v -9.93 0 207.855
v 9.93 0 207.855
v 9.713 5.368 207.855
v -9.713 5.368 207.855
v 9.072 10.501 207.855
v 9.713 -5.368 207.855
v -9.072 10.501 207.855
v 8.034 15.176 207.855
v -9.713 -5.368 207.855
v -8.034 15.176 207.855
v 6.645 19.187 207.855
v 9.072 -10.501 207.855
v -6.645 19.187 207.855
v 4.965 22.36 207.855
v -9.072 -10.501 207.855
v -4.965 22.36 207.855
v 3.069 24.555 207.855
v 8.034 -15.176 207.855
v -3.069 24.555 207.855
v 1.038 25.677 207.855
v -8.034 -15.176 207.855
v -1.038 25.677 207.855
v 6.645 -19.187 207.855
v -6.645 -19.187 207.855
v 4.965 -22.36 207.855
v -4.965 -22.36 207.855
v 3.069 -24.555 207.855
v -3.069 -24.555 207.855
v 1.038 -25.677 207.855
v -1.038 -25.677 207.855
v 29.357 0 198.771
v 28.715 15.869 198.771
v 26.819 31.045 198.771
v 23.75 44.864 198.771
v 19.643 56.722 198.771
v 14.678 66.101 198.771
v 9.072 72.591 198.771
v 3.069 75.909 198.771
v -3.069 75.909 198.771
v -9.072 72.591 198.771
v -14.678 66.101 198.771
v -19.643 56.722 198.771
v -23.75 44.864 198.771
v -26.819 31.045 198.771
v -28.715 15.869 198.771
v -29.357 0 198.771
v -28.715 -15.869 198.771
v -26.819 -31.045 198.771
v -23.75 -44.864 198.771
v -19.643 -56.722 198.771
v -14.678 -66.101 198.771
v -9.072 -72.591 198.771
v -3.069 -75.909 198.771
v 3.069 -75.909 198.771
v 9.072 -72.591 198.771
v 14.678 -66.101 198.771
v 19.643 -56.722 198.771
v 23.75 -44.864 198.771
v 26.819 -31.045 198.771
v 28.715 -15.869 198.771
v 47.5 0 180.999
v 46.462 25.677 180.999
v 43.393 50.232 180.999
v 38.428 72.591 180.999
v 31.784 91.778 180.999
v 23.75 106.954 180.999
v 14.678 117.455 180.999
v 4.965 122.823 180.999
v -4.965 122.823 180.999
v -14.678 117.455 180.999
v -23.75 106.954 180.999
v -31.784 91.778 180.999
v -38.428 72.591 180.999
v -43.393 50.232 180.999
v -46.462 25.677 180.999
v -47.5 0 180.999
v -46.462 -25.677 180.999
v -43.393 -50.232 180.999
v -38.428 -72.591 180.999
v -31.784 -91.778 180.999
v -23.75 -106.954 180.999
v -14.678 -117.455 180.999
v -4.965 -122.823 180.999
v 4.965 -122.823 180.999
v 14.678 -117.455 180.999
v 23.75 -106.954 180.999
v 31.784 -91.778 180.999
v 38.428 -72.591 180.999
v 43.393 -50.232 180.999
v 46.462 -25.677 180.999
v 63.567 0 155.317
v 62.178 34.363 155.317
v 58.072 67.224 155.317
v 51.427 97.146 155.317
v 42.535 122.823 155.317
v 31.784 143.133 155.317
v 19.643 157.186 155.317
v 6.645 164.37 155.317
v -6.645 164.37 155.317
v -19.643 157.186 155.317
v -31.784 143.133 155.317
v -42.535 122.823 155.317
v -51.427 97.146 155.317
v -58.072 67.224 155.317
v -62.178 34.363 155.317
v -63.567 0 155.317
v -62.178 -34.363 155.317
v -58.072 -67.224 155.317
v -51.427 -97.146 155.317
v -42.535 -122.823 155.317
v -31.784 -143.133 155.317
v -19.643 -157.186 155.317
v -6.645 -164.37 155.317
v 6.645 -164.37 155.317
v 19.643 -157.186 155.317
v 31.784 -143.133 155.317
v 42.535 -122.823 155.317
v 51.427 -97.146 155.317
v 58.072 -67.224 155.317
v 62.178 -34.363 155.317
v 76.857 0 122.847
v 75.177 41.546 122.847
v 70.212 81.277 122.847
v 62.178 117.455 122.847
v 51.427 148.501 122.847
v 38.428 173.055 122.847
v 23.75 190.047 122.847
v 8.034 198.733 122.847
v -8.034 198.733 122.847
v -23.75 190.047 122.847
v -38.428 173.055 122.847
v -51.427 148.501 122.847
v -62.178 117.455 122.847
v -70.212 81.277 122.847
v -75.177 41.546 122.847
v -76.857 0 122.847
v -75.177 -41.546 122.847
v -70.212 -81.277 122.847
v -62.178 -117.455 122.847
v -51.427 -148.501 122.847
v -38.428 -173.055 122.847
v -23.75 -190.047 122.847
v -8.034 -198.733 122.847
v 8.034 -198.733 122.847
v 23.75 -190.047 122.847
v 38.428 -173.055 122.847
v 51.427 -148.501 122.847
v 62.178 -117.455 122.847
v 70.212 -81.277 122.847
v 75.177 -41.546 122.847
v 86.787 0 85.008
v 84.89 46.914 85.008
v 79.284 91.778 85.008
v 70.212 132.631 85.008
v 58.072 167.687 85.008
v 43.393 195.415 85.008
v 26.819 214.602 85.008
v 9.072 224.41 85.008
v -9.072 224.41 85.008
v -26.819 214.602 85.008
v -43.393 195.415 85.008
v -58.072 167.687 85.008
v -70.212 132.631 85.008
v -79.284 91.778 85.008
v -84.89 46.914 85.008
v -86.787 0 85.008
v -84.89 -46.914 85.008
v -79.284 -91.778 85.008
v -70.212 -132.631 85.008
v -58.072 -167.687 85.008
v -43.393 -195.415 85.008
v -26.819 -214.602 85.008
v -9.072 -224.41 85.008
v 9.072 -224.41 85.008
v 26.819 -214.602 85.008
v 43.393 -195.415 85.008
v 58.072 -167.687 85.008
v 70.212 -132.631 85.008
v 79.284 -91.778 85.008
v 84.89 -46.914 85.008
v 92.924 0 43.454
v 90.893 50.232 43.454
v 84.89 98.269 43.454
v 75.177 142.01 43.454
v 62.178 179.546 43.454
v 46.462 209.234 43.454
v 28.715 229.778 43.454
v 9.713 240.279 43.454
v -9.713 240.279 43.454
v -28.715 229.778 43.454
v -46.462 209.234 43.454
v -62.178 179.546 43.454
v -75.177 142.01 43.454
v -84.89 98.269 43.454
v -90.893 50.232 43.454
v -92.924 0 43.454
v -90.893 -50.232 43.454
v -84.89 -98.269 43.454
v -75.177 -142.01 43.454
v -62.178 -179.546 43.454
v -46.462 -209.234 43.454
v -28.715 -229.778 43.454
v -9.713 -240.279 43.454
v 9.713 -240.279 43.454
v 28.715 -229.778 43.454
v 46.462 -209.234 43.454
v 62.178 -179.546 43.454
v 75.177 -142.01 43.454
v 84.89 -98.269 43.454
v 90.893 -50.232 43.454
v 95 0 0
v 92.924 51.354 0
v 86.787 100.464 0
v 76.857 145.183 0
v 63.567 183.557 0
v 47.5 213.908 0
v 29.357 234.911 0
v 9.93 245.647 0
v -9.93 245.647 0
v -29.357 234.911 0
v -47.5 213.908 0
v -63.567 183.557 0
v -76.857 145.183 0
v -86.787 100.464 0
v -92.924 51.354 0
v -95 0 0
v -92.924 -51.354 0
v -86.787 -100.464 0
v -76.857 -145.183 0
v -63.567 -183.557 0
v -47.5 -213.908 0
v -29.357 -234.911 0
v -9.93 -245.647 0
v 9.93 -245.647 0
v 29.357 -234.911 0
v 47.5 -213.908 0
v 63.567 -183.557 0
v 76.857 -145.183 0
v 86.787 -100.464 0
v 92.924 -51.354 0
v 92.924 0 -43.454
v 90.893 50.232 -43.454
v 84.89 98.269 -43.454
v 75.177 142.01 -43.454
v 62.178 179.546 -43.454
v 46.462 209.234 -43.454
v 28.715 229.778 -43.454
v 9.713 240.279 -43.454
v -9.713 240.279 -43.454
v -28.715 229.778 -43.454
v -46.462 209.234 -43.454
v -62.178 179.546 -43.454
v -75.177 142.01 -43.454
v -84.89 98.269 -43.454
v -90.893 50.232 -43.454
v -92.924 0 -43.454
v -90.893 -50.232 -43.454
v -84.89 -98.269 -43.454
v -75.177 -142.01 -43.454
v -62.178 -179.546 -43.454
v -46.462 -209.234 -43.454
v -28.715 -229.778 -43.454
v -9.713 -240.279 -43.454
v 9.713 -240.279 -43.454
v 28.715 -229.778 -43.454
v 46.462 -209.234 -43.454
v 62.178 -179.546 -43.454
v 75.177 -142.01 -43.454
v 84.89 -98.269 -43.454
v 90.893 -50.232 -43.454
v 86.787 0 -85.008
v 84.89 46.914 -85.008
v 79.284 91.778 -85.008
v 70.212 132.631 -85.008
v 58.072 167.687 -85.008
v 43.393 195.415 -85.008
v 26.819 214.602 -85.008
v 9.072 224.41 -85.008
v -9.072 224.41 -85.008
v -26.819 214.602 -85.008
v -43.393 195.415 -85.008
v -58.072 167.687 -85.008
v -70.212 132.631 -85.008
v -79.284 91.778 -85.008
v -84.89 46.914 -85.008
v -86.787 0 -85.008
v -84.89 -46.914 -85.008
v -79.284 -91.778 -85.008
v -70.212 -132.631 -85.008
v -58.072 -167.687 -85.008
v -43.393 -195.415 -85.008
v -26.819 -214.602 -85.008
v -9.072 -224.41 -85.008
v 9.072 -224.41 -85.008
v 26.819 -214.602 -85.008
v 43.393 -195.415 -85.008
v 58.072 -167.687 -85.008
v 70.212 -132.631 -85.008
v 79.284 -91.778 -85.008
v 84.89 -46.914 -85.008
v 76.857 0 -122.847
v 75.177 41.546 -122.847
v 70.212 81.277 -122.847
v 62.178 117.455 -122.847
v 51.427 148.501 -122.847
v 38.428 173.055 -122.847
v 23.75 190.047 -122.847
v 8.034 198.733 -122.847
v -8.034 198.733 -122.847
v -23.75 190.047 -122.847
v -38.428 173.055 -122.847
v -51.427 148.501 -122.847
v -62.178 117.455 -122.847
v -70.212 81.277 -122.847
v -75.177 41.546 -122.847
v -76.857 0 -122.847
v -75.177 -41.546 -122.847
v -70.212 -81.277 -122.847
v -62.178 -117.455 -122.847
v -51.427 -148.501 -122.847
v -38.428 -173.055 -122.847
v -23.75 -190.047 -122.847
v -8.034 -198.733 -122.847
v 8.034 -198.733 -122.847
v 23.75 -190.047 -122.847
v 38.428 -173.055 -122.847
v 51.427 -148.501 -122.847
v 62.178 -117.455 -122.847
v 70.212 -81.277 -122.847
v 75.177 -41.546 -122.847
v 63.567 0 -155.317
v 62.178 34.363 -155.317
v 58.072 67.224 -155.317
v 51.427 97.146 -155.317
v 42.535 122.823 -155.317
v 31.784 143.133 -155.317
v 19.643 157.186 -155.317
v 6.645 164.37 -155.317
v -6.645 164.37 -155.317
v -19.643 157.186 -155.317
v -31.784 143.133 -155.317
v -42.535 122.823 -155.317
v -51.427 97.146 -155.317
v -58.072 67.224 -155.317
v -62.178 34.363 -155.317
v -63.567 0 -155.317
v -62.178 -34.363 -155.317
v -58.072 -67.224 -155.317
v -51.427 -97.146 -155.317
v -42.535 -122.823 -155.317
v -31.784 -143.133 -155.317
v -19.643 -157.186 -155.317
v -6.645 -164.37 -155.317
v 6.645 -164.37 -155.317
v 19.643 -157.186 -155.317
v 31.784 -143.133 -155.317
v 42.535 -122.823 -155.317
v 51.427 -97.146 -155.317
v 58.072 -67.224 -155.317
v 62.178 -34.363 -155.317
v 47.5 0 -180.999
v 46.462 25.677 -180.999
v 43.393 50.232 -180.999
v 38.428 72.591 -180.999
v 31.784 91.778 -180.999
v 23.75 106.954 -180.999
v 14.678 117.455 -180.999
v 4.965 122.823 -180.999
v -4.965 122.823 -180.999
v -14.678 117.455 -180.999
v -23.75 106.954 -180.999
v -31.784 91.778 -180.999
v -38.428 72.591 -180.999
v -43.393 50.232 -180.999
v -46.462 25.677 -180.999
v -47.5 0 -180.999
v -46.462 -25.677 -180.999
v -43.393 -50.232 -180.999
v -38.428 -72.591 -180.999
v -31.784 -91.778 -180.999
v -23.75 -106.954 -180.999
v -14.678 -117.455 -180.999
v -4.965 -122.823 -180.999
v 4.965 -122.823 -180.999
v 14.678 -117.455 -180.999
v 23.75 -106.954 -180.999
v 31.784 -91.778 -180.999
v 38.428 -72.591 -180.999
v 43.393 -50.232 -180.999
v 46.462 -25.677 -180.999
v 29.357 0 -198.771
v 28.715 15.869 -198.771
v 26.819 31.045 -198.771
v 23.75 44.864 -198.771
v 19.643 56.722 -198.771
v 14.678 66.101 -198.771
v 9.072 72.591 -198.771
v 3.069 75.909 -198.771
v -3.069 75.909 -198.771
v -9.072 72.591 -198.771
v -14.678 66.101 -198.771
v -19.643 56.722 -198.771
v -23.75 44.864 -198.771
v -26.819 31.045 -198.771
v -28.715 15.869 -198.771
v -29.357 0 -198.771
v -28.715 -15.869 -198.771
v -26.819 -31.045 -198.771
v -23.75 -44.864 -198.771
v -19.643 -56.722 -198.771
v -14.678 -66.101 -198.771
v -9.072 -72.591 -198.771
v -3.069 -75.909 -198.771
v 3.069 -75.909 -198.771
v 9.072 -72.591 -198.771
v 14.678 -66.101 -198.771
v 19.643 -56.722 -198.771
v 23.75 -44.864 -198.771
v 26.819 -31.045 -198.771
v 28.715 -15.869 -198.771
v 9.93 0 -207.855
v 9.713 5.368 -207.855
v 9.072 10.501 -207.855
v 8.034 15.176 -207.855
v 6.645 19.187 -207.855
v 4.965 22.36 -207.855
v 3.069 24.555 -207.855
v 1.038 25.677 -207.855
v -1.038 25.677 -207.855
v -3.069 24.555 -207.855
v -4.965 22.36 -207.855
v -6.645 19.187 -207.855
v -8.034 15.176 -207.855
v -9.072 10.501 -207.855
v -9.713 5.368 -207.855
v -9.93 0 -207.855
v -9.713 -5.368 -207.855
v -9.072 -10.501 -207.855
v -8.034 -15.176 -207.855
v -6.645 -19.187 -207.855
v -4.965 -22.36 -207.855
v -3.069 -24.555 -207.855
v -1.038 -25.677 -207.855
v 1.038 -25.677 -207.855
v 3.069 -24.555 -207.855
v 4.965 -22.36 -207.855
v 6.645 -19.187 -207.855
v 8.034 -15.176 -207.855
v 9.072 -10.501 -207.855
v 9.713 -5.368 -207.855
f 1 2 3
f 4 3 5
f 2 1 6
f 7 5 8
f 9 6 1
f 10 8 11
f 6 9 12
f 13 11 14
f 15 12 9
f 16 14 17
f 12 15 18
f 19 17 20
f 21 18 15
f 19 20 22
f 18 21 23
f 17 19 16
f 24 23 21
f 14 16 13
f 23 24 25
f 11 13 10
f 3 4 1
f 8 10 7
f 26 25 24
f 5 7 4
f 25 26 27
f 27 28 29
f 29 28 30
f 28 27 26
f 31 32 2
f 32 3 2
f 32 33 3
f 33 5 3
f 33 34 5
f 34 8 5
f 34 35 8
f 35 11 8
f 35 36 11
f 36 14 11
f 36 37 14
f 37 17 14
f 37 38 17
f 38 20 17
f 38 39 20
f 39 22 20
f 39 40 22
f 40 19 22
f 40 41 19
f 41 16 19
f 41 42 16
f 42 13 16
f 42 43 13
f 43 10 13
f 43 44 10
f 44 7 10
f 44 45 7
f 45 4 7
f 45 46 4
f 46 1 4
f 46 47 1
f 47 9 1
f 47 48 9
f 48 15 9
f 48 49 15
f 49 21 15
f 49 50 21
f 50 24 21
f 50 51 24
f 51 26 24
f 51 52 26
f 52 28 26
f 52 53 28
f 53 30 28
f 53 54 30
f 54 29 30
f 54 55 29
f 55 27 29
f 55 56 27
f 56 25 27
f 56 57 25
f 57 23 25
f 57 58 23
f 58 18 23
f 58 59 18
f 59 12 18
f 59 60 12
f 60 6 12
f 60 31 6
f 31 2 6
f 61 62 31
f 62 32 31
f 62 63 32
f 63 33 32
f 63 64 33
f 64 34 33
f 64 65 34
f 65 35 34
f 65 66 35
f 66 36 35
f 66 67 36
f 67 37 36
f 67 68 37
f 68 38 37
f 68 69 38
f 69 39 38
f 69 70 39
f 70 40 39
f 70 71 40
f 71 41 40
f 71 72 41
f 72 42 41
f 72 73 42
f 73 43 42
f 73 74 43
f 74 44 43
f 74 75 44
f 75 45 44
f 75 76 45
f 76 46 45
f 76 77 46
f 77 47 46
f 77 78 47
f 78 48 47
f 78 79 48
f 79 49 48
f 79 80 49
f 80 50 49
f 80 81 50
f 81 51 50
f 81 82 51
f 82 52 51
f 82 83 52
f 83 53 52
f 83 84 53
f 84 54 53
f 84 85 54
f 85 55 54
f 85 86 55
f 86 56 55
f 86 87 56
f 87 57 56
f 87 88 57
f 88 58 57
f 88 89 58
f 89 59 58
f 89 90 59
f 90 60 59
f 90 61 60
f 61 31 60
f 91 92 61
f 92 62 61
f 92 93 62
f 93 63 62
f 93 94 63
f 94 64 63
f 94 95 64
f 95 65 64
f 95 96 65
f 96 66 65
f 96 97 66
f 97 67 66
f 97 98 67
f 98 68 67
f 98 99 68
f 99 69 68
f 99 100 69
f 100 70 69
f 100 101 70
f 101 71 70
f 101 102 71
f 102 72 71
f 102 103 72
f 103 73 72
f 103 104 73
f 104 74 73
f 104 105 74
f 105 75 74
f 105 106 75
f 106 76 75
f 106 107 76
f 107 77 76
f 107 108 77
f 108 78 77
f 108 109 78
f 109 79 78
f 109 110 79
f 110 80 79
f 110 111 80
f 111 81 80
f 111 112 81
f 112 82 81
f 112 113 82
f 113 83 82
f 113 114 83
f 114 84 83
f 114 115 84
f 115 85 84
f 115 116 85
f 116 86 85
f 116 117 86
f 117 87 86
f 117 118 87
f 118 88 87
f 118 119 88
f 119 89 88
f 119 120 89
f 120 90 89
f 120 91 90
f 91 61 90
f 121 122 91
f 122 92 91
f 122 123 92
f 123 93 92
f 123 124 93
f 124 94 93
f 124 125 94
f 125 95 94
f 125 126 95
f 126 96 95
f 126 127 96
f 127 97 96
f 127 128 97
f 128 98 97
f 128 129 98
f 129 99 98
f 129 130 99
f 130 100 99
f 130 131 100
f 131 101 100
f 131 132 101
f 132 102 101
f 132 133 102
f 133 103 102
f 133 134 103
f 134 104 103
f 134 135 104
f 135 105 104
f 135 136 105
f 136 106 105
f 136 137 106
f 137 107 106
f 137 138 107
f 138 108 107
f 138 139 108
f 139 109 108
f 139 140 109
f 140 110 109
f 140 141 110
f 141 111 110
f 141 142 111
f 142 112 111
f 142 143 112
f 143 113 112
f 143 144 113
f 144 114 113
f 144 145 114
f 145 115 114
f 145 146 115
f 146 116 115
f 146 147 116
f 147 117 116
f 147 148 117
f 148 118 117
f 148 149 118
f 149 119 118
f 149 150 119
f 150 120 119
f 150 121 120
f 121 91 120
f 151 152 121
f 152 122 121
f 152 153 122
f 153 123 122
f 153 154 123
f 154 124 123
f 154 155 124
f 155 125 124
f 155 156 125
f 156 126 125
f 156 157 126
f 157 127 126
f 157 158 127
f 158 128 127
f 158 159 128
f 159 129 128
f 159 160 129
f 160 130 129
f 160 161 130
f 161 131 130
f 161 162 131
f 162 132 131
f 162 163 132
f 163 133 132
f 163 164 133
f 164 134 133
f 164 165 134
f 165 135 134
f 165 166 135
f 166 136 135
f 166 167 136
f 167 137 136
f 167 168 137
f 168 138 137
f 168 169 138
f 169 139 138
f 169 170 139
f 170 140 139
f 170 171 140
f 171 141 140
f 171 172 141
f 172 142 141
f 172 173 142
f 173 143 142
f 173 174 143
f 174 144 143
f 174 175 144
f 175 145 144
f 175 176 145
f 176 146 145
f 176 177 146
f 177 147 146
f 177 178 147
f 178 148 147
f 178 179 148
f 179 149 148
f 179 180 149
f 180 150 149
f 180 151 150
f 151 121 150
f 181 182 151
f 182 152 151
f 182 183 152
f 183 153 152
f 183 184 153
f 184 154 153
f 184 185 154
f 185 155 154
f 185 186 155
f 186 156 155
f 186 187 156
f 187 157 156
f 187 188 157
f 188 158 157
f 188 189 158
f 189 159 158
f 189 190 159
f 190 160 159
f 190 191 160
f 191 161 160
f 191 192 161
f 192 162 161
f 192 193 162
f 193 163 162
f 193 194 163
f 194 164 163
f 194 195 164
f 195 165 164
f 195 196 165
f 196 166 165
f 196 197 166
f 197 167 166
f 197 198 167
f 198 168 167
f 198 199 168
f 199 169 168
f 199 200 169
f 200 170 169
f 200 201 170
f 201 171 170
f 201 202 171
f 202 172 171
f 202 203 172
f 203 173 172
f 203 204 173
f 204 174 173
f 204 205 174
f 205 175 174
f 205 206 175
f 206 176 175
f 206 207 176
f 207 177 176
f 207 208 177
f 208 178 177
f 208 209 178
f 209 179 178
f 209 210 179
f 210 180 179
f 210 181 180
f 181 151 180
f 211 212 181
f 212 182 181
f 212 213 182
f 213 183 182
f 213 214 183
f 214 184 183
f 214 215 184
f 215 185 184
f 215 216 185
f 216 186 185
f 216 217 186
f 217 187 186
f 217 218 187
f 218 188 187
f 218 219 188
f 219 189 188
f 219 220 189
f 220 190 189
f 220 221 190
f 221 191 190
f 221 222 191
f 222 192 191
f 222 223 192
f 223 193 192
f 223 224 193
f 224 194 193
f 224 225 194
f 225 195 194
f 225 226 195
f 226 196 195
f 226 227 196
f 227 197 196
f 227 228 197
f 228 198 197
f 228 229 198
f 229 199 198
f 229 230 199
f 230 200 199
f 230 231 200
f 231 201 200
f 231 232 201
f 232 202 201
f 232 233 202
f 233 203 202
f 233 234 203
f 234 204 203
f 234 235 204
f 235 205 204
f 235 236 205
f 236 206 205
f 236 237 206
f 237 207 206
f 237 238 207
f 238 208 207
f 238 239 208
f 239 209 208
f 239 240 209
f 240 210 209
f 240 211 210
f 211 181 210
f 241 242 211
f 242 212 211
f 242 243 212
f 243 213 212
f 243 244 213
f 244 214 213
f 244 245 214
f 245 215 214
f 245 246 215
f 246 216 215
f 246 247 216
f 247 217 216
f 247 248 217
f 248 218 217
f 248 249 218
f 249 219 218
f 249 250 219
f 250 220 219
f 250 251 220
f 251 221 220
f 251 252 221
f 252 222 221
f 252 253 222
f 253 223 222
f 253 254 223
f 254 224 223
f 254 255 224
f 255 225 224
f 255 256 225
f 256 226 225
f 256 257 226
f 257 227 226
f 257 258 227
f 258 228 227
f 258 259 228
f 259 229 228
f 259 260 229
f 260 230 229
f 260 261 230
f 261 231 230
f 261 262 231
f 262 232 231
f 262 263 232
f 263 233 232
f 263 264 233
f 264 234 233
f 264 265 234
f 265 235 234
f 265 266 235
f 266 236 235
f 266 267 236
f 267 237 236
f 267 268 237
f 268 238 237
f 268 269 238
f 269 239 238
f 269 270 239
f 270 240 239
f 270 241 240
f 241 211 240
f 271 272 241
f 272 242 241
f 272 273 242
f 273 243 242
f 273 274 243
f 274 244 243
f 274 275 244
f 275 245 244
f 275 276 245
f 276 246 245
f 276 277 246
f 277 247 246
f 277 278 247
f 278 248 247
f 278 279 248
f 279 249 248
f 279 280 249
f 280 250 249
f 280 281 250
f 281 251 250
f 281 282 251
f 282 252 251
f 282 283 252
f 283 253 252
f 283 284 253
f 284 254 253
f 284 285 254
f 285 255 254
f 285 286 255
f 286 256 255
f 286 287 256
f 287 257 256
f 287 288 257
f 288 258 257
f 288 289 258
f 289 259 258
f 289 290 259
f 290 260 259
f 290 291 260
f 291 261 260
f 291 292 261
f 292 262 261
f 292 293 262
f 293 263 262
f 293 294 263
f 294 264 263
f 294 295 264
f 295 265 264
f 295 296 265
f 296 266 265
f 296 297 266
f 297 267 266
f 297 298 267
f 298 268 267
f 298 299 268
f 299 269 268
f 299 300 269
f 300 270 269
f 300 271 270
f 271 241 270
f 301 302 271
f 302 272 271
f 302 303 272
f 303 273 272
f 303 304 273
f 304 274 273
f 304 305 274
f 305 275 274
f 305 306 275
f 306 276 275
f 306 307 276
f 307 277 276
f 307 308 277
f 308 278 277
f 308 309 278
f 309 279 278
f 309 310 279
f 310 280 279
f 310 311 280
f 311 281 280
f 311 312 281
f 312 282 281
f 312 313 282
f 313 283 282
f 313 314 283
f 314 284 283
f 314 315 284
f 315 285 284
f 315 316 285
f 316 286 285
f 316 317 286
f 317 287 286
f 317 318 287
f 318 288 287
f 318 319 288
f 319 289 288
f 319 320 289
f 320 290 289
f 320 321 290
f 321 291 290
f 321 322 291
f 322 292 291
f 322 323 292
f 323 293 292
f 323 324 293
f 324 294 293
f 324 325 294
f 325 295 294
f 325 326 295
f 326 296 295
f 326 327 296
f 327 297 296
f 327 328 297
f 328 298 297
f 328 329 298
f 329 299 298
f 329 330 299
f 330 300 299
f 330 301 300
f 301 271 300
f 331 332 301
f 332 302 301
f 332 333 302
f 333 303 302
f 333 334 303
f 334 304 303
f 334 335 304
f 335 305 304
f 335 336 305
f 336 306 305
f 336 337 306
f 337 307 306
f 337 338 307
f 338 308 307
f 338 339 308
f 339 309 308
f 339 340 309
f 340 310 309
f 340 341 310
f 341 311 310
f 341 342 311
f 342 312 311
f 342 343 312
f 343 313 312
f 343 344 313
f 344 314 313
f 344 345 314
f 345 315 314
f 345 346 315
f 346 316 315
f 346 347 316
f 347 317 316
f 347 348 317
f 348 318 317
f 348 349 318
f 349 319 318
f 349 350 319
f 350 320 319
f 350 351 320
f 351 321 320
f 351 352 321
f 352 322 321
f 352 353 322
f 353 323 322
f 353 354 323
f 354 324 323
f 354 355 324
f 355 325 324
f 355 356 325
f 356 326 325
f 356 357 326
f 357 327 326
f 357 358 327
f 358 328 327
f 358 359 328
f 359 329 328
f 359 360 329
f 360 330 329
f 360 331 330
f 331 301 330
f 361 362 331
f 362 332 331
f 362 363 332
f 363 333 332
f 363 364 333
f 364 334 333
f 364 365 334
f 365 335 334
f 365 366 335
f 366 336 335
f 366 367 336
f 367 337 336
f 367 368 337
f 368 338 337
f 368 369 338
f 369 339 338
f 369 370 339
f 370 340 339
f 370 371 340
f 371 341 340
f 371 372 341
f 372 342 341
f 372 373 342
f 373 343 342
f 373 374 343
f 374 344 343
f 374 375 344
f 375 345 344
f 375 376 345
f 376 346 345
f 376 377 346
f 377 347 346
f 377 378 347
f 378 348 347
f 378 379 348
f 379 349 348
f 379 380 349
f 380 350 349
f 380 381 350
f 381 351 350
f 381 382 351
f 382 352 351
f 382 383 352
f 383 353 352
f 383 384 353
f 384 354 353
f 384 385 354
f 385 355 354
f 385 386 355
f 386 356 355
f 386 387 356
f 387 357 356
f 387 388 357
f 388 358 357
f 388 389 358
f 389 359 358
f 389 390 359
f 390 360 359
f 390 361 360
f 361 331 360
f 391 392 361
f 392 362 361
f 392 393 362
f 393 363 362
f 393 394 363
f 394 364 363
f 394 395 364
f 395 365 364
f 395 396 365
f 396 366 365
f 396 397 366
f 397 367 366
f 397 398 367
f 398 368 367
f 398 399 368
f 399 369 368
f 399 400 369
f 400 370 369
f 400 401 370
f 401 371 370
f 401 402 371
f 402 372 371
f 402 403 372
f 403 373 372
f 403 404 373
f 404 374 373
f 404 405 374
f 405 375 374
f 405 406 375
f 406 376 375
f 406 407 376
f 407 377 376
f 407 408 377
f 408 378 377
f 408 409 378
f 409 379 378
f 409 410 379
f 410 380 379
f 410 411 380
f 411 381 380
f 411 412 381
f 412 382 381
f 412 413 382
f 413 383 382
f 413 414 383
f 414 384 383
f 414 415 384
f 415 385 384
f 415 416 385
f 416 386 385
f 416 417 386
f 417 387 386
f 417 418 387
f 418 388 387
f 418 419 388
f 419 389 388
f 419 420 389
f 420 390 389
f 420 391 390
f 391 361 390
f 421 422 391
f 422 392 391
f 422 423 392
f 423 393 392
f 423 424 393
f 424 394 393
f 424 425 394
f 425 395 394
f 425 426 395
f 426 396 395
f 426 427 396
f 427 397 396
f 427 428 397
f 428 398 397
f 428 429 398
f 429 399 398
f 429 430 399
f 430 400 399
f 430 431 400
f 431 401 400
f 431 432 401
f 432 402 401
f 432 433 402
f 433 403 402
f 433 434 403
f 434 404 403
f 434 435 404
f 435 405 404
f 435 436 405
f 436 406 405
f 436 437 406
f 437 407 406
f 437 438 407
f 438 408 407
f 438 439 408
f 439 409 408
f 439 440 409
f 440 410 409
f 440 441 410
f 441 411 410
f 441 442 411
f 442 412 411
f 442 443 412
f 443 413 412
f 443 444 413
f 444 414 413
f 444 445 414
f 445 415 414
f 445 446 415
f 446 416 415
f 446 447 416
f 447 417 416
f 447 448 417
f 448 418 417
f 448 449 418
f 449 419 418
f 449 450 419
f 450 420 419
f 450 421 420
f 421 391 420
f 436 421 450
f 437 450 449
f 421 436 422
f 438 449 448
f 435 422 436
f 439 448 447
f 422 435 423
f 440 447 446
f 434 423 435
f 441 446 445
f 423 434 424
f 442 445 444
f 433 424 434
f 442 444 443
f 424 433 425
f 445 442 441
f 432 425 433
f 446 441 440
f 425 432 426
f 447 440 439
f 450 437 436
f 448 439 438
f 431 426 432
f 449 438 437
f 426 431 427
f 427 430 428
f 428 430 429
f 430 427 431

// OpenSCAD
// Generated by SolidPython 1.0.1 on 2020-07-29 00:46:46


scale(v = [5, 13, 11]) {
	sphere(r = 19);
}
/***********************************************
*********      SolidPython code:      **********
************************************************
 
# import packages: SolidPython
from solid import *
from solid.utils import *
from itertools import chain, combinations, permutations


class Resize:

    def __init__(self, scad_file):
        self.scad_file = scad_file
        #self.scad_file = import_scad(scad_file)
        # cone/cylinder param:
        self.r1 = 0
        self.r2 = 0
        self.h = 0
        # rectangular prism param:
        self.w = 0
        self.l = 0
        # ellipse param:
        self.r = 0

    # import OpenScad code (file name corresponds to shape)


    # classify shape + parameters
    def assign(self, param1, param2, param3):
        if self.scad_file == 'cone.scad':
            self.r1 = param1
            self.r2 = param2
            self.h = param3
        elif self.scad_file == 'cylinder.scad':
            self.r1 = param1
            self.r2 = param2
            self.h = param3
        elif self.scad_file == 'rectangularPrism.scad':
            self.h = param1
            self.l = param2
            self.w = param3
        else:
            self.r = param1
            self.h = param2

    # resize parameters
    def iterate(self):
        x = range(3, 20, 2)
        i = 1
        if self.scad_file == 'cone.scad':
            tempList = list(permutations(x, 2))
            for temp in tempList:
                param1 = temp[0]
                param2 = temp[1]
                filepath = 'produced_scad_files/' + 'cone' + str(param1) + '_' + str(param2) + '_' + '.scad'
                scad_render_to_file(cylinder(h=param1, r1=param2, r2=0), filepath)

        elif self.scad_file == 'cylinder.scad':
            tempList = list(permutations(x, 3))
            for temp in tempList:
                param1 = temp[0]
                param2 = temp[1]
                filepath = 'produced_scad_files/' + 'cylinder' + str(param1) + '_' + str(param2) + '_' + '.scad'
                scad_render_to_file(cylinder(h=param1, r1=param2, r2=param2), filepath)

        elif self.scad_file == 'rectangularPrism.scad':
            tempList = list(permutations(x, 3))
            for temp in tempList:
                param1 = temp[0]
                param2 = temp[1]
                param3 = temp[2]
                filepath = 'produced_scad_files/' + 'rectangularPrism' + str(param1) + '_' + str(param2) + '_' + str(
                    param3) + '.scad'
                scad_render_to_file(cube(size=(param1, param2, param3)), filepath)

        elif self.scad_file == 'ellipse.scad':
            tempList = list(permutations(x, 4))
            for temp in tempList:
                param1 = temp[0]
                param2 = temp[1]
                param3 = temp[2]
                param4 = temp[3]
                filepath = 'produced_scad_files/' + 'ellipse' + str(param1) + '_' + str(param2) + '_' + str(param3) + '_' + str(param4) + '.scad'
                scad_render_to_file(scale([param1, param2, param3])(sphere(r=param4)), filepath)

    def render_to_scadfile(self):
        scad_render_to_file(scad, 'example.scad') 
 
************************************************/
